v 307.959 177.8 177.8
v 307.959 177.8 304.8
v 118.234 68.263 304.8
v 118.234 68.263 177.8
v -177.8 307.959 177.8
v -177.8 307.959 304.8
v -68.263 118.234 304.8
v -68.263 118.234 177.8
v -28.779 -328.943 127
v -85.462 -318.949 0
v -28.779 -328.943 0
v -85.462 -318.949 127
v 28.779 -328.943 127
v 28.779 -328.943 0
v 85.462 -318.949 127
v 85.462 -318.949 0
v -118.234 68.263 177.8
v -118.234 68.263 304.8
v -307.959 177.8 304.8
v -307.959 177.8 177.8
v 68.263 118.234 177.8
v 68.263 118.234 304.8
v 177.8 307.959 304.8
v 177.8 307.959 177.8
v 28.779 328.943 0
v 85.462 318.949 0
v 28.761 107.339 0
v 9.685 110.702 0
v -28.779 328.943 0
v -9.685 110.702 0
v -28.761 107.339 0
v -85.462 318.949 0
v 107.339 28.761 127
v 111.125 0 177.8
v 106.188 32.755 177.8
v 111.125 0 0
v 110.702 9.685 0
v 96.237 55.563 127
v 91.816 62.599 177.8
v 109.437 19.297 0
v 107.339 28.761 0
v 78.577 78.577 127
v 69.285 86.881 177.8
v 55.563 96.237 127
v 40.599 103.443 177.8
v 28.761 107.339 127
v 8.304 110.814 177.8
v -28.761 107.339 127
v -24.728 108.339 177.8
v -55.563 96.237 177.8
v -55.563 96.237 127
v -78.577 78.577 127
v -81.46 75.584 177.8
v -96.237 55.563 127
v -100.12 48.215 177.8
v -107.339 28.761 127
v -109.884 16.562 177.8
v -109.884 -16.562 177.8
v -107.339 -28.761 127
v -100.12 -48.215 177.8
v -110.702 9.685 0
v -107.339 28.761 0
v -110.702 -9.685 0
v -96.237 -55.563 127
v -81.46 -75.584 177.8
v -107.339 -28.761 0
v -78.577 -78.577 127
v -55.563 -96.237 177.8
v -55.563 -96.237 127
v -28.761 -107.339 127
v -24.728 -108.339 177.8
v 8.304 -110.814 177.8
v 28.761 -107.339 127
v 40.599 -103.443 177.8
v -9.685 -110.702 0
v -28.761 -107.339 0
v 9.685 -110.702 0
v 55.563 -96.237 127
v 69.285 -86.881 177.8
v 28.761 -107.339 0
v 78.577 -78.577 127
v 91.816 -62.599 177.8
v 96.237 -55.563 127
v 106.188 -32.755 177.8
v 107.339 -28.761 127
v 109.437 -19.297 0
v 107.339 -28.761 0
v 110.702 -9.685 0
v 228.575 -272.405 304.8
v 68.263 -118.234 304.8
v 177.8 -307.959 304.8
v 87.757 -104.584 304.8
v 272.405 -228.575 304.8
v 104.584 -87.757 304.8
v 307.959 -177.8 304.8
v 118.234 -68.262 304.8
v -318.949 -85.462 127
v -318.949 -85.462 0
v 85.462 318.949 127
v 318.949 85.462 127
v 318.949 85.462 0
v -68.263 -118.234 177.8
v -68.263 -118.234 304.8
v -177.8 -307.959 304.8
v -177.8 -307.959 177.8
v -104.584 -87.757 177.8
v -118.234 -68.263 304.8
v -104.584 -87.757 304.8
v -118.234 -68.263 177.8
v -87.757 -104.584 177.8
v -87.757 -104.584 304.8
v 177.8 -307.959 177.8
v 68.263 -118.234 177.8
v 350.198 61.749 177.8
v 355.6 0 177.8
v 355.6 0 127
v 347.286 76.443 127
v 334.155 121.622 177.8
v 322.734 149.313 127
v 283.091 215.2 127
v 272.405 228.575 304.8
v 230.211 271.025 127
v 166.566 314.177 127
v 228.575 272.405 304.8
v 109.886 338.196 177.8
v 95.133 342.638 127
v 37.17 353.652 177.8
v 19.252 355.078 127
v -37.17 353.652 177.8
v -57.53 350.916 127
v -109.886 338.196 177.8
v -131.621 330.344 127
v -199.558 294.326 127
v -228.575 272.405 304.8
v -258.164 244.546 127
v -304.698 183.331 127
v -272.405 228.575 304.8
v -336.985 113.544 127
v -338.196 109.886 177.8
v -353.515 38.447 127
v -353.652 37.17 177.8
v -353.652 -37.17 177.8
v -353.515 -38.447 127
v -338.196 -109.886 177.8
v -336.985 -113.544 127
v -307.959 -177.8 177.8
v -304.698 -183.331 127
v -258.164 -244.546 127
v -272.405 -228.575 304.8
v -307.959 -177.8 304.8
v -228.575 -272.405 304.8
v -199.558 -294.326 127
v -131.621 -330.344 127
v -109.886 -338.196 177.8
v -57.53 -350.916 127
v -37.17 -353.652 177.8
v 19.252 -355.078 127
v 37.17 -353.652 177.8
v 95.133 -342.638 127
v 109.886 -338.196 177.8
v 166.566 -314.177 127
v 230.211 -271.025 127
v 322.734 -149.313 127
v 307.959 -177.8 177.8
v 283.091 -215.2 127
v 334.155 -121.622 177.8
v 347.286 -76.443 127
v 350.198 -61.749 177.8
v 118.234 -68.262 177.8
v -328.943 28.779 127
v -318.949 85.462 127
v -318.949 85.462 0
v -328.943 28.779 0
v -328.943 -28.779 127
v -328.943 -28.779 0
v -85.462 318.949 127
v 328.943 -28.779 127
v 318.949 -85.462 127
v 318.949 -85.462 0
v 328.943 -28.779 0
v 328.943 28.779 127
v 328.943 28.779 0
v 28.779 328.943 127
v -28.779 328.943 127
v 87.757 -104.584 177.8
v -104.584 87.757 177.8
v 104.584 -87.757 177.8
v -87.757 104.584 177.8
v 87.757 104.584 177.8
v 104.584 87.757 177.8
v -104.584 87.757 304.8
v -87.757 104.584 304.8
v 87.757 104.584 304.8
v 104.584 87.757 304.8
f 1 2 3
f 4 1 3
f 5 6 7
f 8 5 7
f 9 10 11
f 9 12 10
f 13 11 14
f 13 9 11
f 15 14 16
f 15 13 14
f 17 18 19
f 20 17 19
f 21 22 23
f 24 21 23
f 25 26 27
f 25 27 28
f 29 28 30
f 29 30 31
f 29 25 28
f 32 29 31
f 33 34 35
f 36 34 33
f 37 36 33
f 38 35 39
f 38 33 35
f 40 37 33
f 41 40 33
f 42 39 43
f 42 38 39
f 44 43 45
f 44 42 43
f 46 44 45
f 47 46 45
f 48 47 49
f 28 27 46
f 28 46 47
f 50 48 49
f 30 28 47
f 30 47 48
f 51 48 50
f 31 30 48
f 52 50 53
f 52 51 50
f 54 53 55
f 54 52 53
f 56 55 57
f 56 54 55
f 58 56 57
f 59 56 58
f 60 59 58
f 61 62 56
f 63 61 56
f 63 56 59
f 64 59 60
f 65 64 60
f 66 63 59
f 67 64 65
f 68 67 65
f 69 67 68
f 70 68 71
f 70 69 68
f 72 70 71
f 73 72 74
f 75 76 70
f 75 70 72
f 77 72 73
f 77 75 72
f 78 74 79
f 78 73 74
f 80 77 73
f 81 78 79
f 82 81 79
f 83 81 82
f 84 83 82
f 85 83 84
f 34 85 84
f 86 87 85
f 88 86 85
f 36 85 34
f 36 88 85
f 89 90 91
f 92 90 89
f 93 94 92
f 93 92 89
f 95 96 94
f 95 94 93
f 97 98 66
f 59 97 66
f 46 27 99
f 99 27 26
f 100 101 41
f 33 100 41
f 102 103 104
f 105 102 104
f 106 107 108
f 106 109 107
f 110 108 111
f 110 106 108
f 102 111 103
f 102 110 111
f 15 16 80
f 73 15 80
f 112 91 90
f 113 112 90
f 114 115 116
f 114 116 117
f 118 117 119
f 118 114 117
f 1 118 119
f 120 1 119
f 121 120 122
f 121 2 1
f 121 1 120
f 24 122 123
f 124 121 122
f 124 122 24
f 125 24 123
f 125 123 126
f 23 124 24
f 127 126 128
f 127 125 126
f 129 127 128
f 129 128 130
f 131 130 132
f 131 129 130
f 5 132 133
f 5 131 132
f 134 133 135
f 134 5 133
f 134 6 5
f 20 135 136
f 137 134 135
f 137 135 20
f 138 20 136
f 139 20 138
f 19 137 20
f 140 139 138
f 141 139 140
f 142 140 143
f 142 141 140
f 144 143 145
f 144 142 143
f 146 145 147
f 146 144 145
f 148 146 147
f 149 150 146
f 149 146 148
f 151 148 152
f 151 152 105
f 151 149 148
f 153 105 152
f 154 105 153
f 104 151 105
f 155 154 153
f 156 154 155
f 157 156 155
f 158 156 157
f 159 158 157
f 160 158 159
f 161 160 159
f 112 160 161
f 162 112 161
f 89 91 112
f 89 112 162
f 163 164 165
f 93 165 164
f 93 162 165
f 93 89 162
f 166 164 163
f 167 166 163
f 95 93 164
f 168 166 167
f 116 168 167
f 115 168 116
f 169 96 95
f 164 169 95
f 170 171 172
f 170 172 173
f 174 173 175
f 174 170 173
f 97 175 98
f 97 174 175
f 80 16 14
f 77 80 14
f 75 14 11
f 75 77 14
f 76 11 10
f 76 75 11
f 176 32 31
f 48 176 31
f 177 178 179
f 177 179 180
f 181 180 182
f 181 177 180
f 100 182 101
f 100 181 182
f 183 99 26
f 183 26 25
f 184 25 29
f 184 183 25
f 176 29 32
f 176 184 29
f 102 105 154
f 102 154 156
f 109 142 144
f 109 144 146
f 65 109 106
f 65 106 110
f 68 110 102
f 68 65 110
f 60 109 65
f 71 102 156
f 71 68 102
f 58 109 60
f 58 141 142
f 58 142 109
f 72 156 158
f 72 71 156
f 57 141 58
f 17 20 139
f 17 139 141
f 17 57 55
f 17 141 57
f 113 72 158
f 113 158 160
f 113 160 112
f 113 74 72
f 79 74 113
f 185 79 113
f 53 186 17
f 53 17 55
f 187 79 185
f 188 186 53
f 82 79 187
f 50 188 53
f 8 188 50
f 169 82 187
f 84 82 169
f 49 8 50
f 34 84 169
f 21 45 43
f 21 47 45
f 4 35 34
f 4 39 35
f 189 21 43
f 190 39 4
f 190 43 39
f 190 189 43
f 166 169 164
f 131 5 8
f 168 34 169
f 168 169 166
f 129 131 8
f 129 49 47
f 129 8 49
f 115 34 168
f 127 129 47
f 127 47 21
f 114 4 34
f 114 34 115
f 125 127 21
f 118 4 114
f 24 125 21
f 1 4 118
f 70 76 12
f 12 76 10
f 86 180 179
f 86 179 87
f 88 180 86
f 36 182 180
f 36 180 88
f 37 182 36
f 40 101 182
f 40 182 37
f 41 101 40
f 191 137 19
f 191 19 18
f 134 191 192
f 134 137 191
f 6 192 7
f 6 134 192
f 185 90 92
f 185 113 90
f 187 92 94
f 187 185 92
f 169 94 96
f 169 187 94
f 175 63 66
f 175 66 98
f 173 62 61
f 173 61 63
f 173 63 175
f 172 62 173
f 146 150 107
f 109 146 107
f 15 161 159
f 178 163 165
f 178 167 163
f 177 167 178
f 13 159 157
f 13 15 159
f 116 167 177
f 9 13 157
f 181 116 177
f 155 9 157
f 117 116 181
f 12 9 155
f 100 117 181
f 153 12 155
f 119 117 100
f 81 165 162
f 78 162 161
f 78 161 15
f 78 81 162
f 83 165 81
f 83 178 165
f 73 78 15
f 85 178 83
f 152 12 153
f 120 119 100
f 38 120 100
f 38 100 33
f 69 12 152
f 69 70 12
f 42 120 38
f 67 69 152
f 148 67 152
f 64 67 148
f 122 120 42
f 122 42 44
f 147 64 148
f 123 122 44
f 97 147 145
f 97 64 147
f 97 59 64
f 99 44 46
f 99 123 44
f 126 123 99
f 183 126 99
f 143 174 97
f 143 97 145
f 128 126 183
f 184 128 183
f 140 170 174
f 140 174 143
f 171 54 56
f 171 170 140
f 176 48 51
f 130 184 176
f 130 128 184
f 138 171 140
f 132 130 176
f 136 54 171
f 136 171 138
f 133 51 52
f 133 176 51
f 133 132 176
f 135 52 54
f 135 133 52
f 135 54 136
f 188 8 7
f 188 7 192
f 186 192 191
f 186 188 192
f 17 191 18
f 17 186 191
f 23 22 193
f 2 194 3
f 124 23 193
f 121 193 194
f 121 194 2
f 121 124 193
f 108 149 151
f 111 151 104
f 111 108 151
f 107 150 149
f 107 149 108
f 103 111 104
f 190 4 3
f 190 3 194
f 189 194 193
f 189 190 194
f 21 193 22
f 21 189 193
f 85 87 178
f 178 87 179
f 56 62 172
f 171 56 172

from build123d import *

# Parameters (mm, degrees)
F3_DEPTH = 127
F5_DEPTH = 127


with BuildPart() as f1:
    # F0 (on Front) → F1 (revolve)
    with BuildSketch(Plane.XZ):
        Polygon((136.525, 177.8), (111.125, 177.8), (111.125, 0), (330.2, 0), (330.2, 127), (355.6, 127), (355.6, 304.8), (136.525, 304.8), align=None)
    revolve(axis=Axis((0, 0, 359.9156904304), (0, 0, 1)))

    # F2 (on face) → F3 (cut)
    with BuildSketch(Plane.XY.offset(304.8)):
        with BuildLine():
            ThreePointArc((-307.9586335857, 177.8), (-355.6, 0), (-307.9586335857, -177.8))
            Line((-307.9586335857, -177.8), (-118.2341182517, -68.2625))
            ThreePointArc((-118.2341182517, -68.2625), (-136.525, 0), (-118.2341182517, 68.2625))
            Line((-118.2341182517, 68.2625), (-307.9586335857, 177.8))
        make_face()
        with BuildLine():
            Line((-68.2625, -118.2341182517), (-177.8, -307.9586335857))
            ThreePointArc((-177.8, -307.9586335857), (0, -355.6), (177.8, -307.9586335857))
            Line((177.8, -307.9586335857), (68.2625, -118.2341182517))
            ThreePointArc((68.2625, -118.2341182517), (0, -136.525), (-68.2625, -118.2341182517))
        make_face()
        with BuildLine():
            ThreePointArc((177.8, 307.9586335857), (0, 355.6), (-177.8, 307.9586335857))
            Line((-177.8, 307.9586335857), (-68.2625, 118.2341182517))
            ThreePointArc((-68.2625, 118.2341182517), (0, 136.525), (68.2625, 118.2341182517))
            Line((68.2625, 118.2341182517), (177.8, 307.9586335857))
        make_face()
        with BuildLine():
            Line((307.9586335857, 177.8), (118.2341182517, 68.2625))
            ThreePointArc((118.2341182517, 68.2625), (131.8730234341, 35.3352701326), (136.525, 0))
            ThreePointArc((136.525, 0), (131.8730234341, -35.3352701326), (118.2341182517, -68.2625))
            Line((118.2341182517, -68.2625), (307.9586335857, -177.8))
            ThreePointArc((307.9586335857, -177.8), (343.4832238284, -92.0360524385), (355.6, 0))
            ThreePointArc((355.6, 0), (343.4832238284, 92.0360524385), (307.9586335857, 177.8))
        make_face()
        with BuildLine():
            ThreePointArc((355.6, 0), (343.4832238284, -92.0360524385), (307.9586335857, -177.8))
            Line((307.9586335857, -177.8), (329.9556788419, -190.5))
            ThreePointArc((329.9556788419, -190.5), (381, 0), (329.9556788419, 190.5))
            Line((329.9556788419, 190.5), (307.9586335857, 177.8))
            ThreePointArc((307.9586335857, 177.8), (343.4832238284, 92.0360524385), (355.6, 0))
        make_face()
    extrude(amount=-F3_DEPTH, mode=Mode.SUBTRACT)

    # F4 (on face) → F5 (cut)
    with BuildSketch(Plane(origin=(0, 0, 0), x_dir=(1, 0, 0), z_dir=(0, 0, -1))):
        with BuildLine():
            Line((-28.761266387, 107.3385074464), (-85.4620486929, 318.9487078407))
            ThreePointArc((-85.4620486928, 318.9487078407), (-233.4866591478, 233.4866591478), (-318.9487078407, 85.4620486929))
            Line((-318.9487078407, 85.4620486929), (-107.3385074464, 28.761266387))
            ThreePointArc((-107.3385074464, 28.761266387), (-78.5772410594, 78.5772410594), (-28.761266387, 107.3385074464))
        make_face()
        with BuildLine():
            Line((107.3385074464, 28.761266387), (318.9487078407, 85.4620486929))
            ThreePointArc((318.9487078406, 85.4620486929), (233.4866591478, 233.4866591478), (85.4620486928, 318.9487078407))
            Line((85.4620486929, 318.9487078407), (28.761266387, 107.3385074464))
            ThreePointArc((28.761266387, 107.3385074464), (78.5772410594, 78.5772410594), (107.3385074464, 28.761266387))
        make_face()
        with BuildLine():
            ThreePointArc((85.4620486928, -318.9487078407), (233.4866591478, -233.4866591478), (318.9487078406, -85.4620486929))
            Line((318.9487078407, -85.4620486929), (107.3385074464, -28.761266387))
            ThreePointArc((107.3385074464, -28.761266387), (78.5772410594, -78.5772410594), (28.761266387, -107.3385074464))
            Line((28.761266387, -107.3385074464), (85.4620486929, -318.9487078407))
        make_face()
        with BuildLine():
            ThreePointArc((-318.9487078407, -85.4620486929), (-233.4866591478, -233.4866591478), (-85.4620486928, -318.9487078407))
            Line((-85.4620486929, -318.9487078407), (-28.761266387, -107.3385074464))
            ThreePointArc((-28.761266387, -107.3385074464), (-78.5772410594, -78.5772410594), (-107.3385074464, -28.761266387))
            Line((-107.3385074464, -28.761266387), (-318.9487078407, -85.4620486929))
        make_face()
    extrude(amount=-F5_DEPTH, mode=Mode.SUBTRACT)


solid = f1.part
